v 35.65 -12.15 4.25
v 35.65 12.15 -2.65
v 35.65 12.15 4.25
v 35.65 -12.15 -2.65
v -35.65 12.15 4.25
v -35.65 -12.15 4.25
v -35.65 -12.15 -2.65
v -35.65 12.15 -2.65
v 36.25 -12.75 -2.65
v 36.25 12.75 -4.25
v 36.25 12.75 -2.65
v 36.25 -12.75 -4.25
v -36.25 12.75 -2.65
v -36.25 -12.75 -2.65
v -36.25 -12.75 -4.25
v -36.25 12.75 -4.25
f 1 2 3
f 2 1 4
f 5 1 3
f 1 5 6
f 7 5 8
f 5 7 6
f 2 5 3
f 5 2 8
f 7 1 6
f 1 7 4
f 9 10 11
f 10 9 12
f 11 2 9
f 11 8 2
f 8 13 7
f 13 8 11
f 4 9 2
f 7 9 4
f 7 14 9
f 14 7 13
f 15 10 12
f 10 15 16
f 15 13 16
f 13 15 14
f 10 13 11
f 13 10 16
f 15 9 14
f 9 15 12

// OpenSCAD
// Parameters
overall_width_mm = 71.3; //[35.65:142.6:0.1]
overall_height_mm = 24.3; //[12.15:48.6:0.1]
overall_thickness_mm = 8.5; //[4.25:17:0.1]
bezel_thickness_mm = 3.0; //[1.5:6:0.1]
pcb_thickness_mm = 1.6; //[0.8:3.2:0.1]
pcb_margin_mm = 0.6; //[0.2:2:0.1]
aperture_width_mm = 64.0; //[32:80:0.1]
aperture_height_mm = 14.0; //[7:20:0.1]
aperture_depth_mm = 2.2; //[1:5:0.1]
glass_thickness_mm = 1.2; //[0.6:3:0.1]
glass_clearance_mm = 0.4; //[0.1:1.5:0.1]
mount_hole_diameter_mm = 3.2; //[1.6:6.4:0.1]
mount_hole_spacing_x_mm = 75.0; //[37.5:150:0.1]
mount_hole_spacing_y_mm = 31.0; //[15.5:62:0.1]
pin_header_pitch_mm = 2.54; //[1.27:5.08:0.01]
pin_count = 16; //[8:20:1]
pin_zone_width_mm = 41.0; //[20.5:82:0.1]
pin_zone_height_mm = 6.0; //[3:12:0.1]
pin_zone_thickness_mm = 3.0; //[1.5:8:0.1]
pin_zone_edge_offset_y_mm = 3.0; //[1:8:0.1]

// Use 1-2mm overlap to guarantee manifold connections
overlap_mm = 1.2; //[0.5:2.0:0.1]

// Display module - complete geometry (all parts physically connected)
module display() {

  // Derived Z reference planes (centered model)
  z_front =  overall_thickness_mm/2;
  z_back  = -overall_thickness_mm/2;

  // Bezel occupies the front thickness
  z_bezel_center = z_front - bezel_thickness_mm/2;

  // PCB sits at the back
  z_pcb_center = z_back + pcb_thickness_mm/2;

  // Glass sits behind the bezel front, and overlaps into bezel by overlap_mm
  z_glass_center =
    (z_front - bezel_thickness_mm) + glass_thickness_mm/2 - overlap_mm;

  // Pin zone sits behind PCB and overlaps into PCB by overlap_mm
  z_pin_center =
    (z_back + pcb_thickness_mm) + pin_zone_thickness_mm/2 - overlap_mm;

  // Thin strip/plate: MUST be attached (overlap into PCB by overlap_mm)
  strip_thickness_mm = 1.2;
  strip_height_mm    = 2.0;
  // Place it just behind the PCB so it intersects the PCB volume by overlap_mm
  z_strip_center =
    (z_back + pcb_thickness_mm) + strip_thickness_mm/2 - overlap_mm;

  color([0.0, 0.4, 0.2]) { // PCB/green parts
    union() {

      // Bezel (front) with aperture cut
      difference() {
        translate([0, 0, z_bezel_center])
          cube([overall_width_mm, overall_height_mm, bezel_thickness_mm], center=true);

        // Cut aperture into bezel (ensure cut fully passes through bezel with overlap)
        translate([0, 0, z_front - aperture_depth_mm/2])
          cube([aperture_width_mm, aperture_height_mm, aperture_depth_mm + 2*overlap_mm], center=true);
      }

      // PCB backing plate (rear)
      translate([0, 0, z_pcb_center])
        cube([overall_width_mm + 2*pcb_margin_mm,
              overall_height_mm + 2*pcb_margin_mm,
              pcb_thickness_mm], center=true);

      // Pin header interface zone (rear, near bottom edge) - overlaps PCB
      translate([
        0,
        -(overall_height_mm + 2*pcb_margin_mm)/2 + pin_zone_edge_offset_y_mm + pin_zone_height_mm/2,
        z_pin_center
      ])
        cube([pin_zone_width_mm, pin_zone_height_mm, pin_zone_thickness_mm], center=true);

      // Display glass (overlaps bezel by overlap_mm)
      translate([0, 0, z_glass_center])
        cube([aperture_width_mm - 2*glass_clearance_mm,
              aperture_height_mm - 2*glass_clearance_mm,
              glass_thickness_mm], center=true);

      // Structural fix: thin strip/plate that was floating
      // Now positioned to INTERSECT the PCB by overlap_mm (not just "near" it).
      translate([
        0,
        -(overall_height_mm + 2*pcb_margin_mm)/2 + strip_height_mm/2, // along bottom edge
        z_strip_center
      ])
        cube([overall_width_mm + 2*pcb_margin_mm, strip_height_mm, strip_thickness_mm], center=true);
    }
  }
}

// Mod - complete geometry
module mod() {
  color([0.1, 0.1, 0.6]) { // Blue color for mod
    cube([overall_width_mm, overall_height_mm, overall_thickness_mm], center=true);
  }
}

// Assembly (single connected solid via union; holes applied after union)
module assembly() {
  difference() {
    union() {
      display();
      mod();
    }

    // Mounting holes (cut through the combined solid)
    for (x = [-1, 1], y = [-1, 1]) {
      translate([x * mount_hole_spacing_x_mm/2, y * mount_hole_spacing_y_mm/2, 0])
        cylinder(r=mount_hole_diameter_mm/2, h=overall_thickness_mm + 2*overlap_mm, center=true);
    }
  }
}

assembly();
